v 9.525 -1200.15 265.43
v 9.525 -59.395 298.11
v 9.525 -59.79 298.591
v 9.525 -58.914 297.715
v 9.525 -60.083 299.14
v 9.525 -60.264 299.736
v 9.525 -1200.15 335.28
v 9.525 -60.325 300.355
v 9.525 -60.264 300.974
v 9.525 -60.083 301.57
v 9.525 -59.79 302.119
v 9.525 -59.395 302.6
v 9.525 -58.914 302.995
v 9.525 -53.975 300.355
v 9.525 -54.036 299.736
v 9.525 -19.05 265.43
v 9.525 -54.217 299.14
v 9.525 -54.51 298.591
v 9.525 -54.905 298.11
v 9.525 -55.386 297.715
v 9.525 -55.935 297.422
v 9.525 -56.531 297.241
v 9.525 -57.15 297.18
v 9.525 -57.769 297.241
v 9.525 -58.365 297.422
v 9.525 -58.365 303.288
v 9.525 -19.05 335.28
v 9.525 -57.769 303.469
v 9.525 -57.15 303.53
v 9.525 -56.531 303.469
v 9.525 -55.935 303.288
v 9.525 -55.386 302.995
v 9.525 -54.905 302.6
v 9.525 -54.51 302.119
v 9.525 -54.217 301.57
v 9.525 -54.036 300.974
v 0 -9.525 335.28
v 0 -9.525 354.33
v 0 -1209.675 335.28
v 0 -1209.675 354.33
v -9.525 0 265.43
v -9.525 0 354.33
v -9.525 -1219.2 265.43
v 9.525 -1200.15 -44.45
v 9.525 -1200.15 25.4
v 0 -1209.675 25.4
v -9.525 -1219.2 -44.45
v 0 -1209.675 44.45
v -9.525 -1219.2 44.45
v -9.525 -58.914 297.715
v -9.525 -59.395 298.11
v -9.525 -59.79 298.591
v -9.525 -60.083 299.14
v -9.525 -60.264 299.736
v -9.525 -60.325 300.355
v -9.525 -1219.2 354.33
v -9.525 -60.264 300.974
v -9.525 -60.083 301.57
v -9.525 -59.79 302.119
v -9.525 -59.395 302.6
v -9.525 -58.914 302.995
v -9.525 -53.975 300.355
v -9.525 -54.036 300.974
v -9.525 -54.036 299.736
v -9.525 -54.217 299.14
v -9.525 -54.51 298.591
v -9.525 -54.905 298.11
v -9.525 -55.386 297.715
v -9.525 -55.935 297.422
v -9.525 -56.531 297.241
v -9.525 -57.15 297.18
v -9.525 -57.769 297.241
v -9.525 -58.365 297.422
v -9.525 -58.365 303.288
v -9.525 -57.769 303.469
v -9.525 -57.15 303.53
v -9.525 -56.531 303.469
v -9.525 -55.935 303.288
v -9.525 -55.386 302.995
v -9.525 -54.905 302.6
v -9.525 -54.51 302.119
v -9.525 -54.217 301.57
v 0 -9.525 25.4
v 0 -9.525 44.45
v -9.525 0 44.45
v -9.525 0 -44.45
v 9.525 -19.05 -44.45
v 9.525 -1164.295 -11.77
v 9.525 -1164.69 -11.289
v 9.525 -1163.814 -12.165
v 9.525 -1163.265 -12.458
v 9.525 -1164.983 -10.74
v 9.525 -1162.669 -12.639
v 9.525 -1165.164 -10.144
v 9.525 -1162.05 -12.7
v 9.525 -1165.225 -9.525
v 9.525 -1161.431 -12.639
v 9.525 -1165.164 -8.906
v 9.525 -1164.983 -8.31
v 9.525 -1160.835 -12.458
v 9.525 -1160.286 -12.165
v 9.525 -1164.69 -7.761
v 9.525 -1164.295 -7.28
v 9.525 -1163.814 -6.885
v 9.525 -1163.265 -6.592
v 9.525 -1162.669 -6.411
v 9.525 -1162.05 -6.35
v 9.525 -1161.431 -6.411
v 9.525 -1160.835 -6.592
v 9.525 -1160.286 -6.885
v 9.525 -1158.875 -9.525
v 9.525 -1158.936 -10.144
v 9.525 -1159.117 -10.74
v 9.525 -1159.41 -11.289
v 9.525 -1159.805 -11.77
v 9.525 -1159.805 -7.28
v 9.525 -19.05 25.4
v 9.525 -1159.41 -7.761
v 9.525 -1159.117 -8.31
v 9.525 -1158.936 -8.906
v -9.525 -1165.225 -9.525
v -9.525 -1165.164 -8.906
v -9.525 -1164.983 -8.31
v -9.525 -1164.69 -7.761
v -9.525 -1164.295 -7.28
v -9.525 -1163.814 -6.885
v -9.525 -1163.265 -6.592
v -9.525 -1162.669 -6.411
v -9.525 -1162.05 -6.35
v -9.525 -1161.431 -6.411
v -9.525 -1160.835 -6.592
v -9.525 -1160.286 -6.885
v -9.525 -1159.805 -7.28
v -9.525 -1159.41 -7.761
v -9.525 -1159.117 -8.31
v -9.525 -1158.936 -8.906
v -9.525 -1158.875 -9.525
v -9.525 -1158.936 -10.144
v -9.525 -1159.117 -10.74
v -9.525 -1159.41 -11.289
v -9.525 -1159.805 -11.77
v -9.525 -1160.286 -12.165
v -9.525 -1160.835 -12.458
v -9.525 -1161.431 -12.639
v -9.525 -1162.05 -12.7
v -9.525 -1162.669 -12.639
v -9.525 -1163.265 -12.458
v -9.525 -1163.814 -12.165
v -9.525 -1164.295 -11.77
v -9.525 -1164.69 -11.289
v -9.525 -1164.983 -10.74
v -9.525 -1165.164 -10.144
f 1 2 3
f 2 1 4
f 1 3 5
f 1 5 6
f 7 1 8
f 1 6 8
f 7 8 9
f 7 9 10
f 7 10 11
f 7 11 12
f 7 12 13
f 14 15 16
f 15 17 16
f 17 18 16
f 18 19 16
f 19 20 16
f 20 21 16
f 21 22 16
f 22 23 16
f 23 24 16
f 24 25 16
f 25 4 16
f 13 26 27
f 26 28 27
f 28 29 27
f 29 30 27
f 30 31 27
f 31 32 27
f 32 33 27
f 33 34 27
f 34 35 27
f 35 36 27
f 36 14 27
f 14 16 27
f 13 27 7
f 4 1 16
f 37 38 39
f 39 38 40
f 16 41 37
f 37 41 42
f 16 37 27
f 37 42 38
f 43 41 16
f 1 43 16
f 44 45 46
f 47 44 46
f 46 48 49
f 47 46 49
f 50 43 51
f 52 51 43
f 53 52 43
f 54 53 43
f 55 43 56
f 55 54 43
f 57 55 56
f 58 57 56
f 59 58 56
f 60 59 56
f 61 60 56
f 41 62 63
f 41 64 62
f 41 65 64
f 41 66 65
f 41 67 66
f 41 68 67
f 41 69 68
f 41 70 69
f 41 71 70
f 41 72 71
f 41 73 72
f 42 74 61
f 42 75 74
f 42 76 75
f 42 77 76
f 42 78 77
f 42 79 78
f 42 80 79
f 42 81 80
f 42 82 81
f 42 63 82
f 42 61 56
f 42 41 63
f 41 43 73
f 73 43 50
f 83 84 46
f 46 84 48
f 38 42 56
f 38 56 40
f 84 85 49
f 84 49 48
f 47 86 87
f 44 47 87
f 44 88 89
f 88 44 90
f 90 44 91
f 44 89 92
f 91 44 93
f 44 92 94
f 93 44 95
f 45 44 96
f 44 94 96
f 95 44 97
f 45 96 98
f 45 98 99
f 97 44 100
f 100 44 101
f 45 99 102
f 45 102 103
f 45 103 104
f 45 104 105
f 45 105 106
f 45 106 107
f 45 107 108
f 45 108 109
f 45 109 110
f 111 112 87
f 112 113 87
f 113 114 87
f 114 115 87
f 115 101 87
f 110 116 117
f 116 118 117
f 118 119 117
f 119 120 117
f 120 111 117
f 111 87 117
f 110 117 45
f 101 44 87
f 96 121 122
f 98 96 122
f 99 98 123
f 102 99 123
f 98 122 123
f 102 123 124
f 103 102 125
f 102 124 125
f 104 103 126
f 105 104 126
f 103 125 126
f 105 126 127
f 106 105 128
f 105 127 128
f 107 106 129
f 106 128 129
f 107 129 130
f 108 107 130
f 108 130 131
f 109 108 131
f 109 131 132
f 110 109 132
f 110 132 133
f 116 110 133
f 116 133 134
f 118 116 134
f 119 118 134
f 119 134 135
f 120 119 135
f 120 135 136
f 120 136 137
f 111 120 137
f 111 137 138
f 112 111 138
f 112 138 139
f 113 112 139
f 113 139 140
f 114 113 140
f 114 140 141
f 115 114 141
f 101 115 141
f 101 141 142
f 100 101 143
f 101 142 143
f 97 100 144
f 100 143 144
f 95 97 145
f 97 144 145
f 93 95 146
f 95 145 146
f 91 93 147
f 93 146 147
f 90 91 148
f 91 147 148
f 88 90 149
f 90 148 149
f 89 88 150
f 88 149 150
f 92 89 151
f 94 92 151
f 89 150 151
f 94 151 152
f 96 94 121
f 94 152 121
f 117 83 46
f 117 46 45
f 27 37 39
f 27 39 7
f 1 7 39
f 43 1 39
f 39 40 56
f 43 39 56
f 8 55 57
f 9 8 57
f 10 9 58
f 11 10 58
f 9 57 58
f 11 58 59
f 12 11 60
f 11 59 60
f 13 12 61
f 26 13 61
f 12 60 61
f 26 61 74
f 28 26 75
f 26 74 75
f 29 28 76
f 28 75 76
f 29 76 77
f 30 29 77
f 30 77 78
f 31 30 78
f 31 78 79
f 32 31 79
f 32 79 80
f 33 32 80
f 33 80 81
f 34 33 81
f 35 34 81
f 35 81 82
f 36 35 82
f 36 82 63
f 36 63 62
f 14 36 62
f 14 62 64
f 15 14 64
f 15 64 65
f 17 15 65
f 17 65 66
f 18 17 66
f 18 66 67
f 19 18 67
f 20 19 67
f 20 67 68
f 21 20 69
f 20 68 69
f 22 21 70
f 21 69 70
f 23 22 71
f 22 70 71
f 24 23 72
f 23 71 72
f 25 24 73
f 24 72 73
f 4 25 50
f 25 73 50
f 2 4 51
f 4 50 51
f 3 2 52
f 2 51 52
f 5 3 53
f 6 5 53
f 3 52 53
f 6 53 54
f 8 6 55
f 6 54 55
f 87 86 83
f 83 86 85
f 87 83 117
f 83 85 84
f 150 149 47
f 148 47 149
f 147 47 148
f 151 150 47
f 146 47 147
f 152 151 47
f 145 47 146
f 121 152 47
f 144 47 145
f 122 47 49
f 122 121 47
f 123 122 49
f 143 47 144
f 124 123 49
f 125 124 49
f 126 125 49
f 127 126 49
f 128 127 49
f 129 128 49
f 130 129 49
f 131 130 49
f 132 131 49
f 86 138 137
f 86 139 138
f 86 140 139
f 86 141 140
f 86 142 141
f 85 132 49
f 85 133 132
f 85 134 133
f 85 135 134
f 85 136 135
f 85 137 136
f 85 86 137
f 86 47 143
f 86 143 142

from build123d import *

# Parameters (mm, degrees)
F0_W     = 19.05
F0_H     = 88.9
F1_DEPTH = 1219.2
F3_DEPTH = 88.901
F5_DEPTH = 19.05
F8_D     = 6.35
F10_D    = 6.35


with BuildPart() as f1:
    # F0 (on Front) → F1 (new body)
    with BuildSketch(Plane.XZ):
        Rectangle(F0_W, F0_H)
    extrude(amount=F1_DEPTH)

    # F2 (on face) → F3 (cut, through all)
    with BuildSketch(Plane.XY.offset(44.45)):
        Polygon((9.525, -1200.15), (-9.525, -1219.2), (0, -1219.2), (9.525, -1219.2), align=None)
        Polygon((0, 0), (-9.525, 0), (9.525, -19.05), (9.525, 0), align=None)
    extrude(amount=-F3_DEPTH, mode=Mode.SUBTRACT)

    # F4 (on face) → F5 (cut)
    with BuildSketch(Plane.XY.offset(44.45)):
        Polygon((0, -9.525), (0, -1209.675), (9.525, -1200.15), (9.525, -19.05), align=None)
    extrude(amount=-F5_DEPTH, mode=Mode.SUBTRACT)


with BuildPart() as f6_1:
    # F6: copy of F1
    add(f1.part.moved(Location((0, 0, 309.88))))

    # F8 (through all)
    with Locations(Plane.YZ.offset(9.525)):
        with Locations((-57.15, 300.355)):
            Hole(F8_D / 2)


with BuildPart() as f1_1:
    add(f1.part)

    # F10 (through all)
    with Locations(Plane.YZ.offset(9.525)):
        with Locations((-1162.05, -9.525)):
            Hole(F10_D / 2)


solid = Compound([f6_1.part, f1_1.part])
